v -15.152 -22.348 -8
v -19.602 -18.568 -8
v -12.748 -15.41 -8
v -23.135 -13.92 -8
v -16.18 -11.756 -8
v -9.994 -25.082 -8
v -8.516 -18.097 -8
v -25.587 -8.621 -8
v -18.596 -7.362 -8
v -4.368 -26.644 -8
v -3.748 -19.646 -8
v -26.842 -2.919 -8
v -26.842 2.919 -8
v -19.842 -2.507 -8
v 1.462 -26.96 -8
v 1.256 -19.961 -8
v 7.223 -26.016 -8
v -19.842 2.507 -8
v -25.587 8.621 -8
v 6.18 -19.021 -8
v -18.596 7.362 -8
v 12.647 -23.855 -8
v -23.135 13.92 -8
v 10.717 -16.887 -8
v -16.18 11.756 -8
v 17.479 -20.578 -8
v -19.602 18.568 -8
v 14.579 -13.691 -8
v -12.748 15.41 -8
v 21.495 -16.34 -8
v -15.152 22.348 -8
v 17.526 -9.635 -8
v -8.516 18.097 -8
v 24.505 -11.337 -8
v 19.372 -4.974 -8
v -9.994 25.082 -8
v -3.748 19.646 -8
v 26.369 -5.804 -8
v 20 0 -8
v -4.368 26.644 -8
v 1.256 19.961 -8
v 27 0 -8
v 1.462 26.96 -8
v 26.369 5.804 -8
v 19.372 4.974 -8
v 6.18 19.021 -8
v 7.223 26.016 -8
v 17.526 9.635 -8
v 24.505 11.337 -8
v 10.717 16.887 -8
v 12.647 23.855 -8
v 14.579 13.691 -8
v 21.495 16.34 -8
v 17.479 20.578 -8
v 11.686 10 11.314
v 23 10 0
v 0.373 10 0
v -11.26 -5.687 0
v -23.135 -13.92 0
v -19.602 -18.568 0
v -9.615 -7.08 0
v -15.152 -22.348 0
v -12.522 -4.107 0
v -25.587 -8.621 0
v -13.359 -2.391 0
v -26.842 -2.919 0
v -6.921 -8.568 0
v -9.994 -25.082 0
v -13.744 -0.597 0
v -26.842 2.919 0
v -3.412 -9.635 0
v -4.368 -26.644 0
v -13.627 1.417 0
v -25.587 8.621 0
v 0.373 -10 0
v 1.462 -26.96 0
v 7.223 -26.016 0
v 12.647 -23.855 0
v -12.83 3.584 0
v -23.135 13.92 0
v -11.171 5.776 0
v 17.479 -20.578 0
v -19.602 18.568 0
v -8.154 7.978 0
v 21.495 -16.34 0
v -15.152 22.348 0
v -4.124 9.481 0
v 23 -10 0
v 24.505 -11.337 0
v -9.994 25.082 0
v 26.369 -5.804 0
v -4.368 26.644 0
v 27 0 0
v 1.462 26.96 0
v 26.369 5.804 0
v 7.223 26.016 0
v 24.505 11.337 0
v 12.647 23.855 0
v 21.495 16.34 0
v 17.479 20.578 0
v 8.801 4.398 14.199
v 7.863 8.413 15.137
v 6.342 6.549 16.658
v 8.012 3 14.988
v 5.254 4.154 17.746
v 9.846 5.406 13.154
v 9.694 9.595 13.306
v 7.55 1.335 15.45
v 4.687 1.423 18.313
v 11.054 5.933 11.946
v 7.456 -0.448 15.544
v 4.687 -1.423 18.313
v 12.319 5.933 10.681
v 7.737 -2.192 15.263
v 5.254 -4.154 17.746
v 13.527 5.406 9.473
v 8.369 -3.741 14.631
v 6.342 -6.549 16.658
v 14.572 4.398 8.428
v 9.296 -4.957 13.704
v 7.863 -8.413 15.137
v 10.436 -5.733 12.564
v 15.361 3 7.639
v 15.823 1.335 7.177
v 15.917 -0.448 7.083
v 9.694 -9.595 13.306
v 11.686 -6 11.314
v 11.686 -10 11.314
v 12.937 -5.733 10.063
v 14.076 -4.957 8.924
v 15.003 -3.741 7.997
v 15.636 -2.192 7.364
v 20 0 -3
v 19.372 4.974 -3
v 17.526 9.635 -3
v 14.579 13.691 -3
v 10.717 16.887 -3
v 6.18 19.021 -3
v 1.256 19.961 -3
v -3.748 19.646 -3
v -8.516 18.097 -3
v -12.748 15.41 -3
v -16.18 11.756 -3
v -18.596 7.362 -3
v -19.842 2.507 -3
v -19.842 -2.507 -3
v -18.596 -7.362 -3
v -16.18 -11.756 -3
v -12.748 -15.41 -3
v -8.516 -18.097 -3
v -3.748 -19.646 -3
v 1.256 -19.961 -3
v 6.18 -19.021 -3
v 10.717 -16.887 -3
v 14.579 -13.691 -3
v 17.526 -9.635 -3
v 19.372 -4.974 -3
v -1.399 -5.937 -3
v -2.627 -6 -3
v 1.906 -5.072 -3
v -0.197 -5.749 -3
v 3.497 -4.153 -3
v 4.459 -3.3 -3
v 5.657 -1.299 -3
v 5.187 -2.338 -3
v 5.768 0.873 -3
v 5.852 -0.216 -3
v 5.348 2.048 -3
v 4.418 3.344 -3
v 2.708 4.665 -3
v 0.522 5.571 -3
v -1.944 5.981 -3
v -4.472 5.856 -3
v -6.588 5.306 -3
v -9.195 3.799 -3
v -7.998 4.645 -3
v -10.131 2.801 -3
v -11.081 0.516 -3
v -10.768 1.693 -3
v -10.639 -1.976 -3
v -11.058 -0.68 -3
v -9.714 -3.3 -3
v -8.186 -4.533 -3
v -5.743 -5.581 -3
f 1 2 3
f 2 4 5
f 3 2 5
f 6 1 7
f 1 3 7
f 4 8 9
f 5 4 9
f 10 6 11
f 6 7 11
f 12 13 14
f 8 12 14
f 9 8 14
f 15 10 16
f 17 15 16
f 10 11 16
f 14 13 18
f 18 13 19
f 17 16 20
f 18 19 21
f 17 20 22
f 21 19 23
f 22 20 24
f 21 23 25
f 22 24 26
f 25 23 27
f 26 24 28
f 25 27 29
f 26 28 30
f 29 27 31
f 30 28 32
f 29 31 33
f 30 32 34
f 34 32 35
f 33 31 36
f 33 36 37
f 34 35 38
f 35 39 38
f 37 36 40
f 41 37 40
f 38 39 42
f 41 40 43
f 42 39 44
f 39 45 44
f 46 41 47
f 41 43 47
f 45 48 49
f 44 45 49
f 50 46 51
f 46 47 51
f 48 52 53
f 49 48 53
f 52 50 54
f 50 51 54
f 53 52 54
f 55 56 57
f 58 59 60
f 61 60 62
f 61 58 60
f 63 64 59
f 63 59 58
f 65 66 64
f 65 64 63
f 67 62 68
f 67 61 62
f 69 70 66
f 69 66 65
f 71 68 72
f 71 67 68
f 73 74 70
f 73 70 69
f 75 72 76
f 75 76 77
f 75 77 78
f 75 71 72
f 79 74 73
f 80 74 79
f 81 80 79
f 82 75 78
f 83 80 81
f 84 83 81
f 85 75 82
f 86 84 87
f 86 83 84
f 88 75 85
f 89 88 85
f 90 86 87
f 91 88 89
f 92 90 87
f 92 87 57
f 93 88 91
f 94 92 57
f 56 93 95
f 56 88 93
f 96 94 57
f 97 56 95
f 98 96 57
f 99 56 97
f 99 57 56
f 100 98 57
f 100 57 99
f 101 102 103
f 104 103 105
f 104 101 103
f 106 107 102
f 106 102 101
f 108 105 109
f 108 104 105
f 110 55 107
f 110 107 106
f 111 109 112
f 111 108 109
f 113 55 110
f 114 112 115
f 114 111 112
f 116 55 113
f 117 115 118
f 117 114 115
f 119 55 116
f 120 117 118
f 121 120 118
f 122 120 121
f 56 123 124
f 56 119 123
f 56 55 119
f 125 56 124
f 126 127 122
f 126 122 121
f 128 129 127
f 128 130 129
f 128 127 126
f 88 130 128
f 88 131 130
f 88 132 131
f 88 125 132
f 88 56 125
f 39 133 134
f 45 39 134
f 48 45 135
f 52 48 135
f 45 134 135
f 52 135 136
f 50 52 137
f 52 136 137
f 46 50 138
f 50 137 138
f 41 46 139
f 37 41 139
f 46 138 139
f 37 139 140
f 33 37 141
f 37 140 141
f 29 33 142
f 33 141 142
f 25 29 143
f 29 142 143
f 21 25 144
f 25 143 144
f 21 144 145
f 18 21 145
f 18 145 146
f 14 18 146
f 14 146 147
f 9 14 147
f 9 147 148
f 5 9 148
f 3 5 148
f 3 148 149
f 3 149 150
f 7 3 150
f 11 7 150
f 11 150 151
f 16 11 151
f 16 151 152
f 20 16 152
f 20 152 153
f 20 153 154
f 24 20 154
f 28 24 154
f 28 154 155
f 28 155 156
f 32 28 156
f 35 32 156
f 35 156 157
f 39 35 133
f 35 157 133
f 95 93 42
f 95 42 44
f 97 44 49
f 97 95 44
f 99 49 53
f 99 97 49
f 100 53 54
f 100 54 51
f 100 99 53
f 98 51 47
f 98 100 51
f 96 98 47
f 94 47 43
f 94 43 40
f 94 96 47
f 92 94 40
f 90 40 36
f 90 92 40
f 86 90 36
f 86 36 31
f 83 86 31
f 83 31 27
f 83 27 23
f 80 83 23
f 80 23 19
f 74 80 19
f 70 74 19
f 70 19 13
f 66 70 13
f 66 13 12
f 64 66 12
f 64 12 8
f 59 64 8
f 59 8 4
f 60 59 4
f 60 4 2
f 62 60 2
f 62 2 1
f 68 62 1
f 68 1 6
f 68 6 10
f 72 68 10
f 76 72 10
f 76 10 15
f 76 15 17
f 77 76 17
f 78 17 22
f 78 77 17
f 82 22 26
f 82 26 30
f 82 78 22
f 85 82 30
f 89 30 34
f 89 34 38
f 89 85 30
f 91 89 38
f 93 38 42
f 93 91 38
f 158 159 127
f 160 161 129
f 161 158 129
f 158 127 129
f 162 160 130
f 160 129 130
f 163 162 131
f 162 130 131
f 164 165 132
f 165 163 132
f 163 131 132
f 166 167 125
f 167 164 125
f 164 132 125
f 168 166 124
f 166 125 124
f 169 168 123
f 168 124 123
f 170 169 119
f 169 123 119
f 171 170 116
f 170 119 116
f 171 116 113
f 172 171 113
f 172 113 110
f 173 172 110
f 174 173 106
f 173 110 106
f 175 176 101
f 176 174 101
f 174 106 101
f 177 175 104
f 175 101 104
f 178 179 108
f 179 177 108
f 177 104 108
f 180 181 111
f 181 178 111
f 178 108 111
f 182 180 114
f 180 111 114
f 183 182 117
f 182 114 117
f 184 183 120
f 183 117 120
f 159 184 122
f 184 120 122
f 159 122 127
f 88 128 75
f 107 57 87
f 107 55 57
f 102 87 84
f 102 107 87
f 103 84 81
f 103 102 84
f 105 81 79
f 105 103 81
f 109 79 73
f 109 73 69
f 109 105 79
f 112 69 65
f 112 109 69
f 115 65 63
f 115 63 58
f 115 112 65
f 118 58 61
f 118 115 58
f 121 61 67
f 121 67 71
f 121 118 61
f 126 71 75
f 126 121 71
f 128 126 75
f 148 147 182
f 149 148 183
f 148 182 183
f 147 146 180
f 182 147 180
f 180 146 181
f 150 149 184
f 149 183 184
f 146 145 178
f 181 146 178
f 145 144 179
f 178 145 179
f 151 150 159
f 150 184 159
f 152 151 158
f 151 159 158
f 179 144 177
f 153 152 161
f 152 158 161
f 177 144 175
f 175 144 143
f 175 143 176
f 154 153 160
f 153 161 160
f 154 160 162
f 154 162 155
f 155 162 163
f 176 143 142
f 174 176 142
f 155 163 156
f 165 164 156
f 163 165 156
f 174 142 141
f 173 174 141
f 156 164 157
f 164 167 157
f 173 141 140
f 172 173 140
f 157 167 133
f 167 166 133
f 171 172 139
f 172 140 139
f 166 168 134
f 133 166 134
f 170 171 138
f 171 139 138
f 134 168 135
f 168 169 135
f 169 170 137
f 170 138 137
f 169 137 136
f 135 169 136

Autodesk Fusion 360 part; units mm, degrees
sketch "草图1" plane through (0, 0, 0) normal (0, 0, 1) x (1, 0, 0)
  circle A0 centre (0, 0) radius 27
  circle A1 centre (0, 0) radius 20
  dimension "d1" = 54
  dimension "d2" = 40
extrude "拉伸1" add sketch "草图1" against normal blind 8
extrude "拉伸2" add sketch "草图1" against normal blind 3 contours A1
sketch "草图2" plane through (0, 0, 0) normal (0, 0, 1) x (-1, 0, 0)
  circle A0 centre (0, 0) radius 27
  line L0 (-23, -10) -> (-23, 10)
  line L1 (30, 0) -> (-47, 0) construction
  dimension "d7" = 20
  dimension "d8" = 23
ref_plane "工作平面1" through (23, 0, 0) normal (0.7071, 0, 0.7071) x (0, -1, 0)
sketch "草图3" plane through (11.5, 0, 11.5) normal (0.7071, 0, 0.7071) x (0, -1, 0)
  circle A0 centre (0, 0.2635) radius 6
  line L0 (10, 0.2635) -> (10, 16.2635)
  line L1 (10, 16.2635) -> (-10, 16.2635)
  line L2 (-10, 16.2635) -> (-10, 0.2635)
  line L3 (0, 0) -> (0, 19) construction
  arc A1 (-10, 0.2635) -> (10, 0.2635) centre (0, 0.2635) ccw
  dimension "d10" = 10
  dimension "d11" = 12
  dimension "d12" = 16
extrude "拉伸3" add sketch "草图3" along normal up to surface end surface through (0, 0, -3) normal (0, 0, -1) offset 0
extrude "拉伸4" cut sketch "草图3" along normal up to surface contours A0 end surface through (0, 0, -3) normal (0, 0, -1) offset 0
